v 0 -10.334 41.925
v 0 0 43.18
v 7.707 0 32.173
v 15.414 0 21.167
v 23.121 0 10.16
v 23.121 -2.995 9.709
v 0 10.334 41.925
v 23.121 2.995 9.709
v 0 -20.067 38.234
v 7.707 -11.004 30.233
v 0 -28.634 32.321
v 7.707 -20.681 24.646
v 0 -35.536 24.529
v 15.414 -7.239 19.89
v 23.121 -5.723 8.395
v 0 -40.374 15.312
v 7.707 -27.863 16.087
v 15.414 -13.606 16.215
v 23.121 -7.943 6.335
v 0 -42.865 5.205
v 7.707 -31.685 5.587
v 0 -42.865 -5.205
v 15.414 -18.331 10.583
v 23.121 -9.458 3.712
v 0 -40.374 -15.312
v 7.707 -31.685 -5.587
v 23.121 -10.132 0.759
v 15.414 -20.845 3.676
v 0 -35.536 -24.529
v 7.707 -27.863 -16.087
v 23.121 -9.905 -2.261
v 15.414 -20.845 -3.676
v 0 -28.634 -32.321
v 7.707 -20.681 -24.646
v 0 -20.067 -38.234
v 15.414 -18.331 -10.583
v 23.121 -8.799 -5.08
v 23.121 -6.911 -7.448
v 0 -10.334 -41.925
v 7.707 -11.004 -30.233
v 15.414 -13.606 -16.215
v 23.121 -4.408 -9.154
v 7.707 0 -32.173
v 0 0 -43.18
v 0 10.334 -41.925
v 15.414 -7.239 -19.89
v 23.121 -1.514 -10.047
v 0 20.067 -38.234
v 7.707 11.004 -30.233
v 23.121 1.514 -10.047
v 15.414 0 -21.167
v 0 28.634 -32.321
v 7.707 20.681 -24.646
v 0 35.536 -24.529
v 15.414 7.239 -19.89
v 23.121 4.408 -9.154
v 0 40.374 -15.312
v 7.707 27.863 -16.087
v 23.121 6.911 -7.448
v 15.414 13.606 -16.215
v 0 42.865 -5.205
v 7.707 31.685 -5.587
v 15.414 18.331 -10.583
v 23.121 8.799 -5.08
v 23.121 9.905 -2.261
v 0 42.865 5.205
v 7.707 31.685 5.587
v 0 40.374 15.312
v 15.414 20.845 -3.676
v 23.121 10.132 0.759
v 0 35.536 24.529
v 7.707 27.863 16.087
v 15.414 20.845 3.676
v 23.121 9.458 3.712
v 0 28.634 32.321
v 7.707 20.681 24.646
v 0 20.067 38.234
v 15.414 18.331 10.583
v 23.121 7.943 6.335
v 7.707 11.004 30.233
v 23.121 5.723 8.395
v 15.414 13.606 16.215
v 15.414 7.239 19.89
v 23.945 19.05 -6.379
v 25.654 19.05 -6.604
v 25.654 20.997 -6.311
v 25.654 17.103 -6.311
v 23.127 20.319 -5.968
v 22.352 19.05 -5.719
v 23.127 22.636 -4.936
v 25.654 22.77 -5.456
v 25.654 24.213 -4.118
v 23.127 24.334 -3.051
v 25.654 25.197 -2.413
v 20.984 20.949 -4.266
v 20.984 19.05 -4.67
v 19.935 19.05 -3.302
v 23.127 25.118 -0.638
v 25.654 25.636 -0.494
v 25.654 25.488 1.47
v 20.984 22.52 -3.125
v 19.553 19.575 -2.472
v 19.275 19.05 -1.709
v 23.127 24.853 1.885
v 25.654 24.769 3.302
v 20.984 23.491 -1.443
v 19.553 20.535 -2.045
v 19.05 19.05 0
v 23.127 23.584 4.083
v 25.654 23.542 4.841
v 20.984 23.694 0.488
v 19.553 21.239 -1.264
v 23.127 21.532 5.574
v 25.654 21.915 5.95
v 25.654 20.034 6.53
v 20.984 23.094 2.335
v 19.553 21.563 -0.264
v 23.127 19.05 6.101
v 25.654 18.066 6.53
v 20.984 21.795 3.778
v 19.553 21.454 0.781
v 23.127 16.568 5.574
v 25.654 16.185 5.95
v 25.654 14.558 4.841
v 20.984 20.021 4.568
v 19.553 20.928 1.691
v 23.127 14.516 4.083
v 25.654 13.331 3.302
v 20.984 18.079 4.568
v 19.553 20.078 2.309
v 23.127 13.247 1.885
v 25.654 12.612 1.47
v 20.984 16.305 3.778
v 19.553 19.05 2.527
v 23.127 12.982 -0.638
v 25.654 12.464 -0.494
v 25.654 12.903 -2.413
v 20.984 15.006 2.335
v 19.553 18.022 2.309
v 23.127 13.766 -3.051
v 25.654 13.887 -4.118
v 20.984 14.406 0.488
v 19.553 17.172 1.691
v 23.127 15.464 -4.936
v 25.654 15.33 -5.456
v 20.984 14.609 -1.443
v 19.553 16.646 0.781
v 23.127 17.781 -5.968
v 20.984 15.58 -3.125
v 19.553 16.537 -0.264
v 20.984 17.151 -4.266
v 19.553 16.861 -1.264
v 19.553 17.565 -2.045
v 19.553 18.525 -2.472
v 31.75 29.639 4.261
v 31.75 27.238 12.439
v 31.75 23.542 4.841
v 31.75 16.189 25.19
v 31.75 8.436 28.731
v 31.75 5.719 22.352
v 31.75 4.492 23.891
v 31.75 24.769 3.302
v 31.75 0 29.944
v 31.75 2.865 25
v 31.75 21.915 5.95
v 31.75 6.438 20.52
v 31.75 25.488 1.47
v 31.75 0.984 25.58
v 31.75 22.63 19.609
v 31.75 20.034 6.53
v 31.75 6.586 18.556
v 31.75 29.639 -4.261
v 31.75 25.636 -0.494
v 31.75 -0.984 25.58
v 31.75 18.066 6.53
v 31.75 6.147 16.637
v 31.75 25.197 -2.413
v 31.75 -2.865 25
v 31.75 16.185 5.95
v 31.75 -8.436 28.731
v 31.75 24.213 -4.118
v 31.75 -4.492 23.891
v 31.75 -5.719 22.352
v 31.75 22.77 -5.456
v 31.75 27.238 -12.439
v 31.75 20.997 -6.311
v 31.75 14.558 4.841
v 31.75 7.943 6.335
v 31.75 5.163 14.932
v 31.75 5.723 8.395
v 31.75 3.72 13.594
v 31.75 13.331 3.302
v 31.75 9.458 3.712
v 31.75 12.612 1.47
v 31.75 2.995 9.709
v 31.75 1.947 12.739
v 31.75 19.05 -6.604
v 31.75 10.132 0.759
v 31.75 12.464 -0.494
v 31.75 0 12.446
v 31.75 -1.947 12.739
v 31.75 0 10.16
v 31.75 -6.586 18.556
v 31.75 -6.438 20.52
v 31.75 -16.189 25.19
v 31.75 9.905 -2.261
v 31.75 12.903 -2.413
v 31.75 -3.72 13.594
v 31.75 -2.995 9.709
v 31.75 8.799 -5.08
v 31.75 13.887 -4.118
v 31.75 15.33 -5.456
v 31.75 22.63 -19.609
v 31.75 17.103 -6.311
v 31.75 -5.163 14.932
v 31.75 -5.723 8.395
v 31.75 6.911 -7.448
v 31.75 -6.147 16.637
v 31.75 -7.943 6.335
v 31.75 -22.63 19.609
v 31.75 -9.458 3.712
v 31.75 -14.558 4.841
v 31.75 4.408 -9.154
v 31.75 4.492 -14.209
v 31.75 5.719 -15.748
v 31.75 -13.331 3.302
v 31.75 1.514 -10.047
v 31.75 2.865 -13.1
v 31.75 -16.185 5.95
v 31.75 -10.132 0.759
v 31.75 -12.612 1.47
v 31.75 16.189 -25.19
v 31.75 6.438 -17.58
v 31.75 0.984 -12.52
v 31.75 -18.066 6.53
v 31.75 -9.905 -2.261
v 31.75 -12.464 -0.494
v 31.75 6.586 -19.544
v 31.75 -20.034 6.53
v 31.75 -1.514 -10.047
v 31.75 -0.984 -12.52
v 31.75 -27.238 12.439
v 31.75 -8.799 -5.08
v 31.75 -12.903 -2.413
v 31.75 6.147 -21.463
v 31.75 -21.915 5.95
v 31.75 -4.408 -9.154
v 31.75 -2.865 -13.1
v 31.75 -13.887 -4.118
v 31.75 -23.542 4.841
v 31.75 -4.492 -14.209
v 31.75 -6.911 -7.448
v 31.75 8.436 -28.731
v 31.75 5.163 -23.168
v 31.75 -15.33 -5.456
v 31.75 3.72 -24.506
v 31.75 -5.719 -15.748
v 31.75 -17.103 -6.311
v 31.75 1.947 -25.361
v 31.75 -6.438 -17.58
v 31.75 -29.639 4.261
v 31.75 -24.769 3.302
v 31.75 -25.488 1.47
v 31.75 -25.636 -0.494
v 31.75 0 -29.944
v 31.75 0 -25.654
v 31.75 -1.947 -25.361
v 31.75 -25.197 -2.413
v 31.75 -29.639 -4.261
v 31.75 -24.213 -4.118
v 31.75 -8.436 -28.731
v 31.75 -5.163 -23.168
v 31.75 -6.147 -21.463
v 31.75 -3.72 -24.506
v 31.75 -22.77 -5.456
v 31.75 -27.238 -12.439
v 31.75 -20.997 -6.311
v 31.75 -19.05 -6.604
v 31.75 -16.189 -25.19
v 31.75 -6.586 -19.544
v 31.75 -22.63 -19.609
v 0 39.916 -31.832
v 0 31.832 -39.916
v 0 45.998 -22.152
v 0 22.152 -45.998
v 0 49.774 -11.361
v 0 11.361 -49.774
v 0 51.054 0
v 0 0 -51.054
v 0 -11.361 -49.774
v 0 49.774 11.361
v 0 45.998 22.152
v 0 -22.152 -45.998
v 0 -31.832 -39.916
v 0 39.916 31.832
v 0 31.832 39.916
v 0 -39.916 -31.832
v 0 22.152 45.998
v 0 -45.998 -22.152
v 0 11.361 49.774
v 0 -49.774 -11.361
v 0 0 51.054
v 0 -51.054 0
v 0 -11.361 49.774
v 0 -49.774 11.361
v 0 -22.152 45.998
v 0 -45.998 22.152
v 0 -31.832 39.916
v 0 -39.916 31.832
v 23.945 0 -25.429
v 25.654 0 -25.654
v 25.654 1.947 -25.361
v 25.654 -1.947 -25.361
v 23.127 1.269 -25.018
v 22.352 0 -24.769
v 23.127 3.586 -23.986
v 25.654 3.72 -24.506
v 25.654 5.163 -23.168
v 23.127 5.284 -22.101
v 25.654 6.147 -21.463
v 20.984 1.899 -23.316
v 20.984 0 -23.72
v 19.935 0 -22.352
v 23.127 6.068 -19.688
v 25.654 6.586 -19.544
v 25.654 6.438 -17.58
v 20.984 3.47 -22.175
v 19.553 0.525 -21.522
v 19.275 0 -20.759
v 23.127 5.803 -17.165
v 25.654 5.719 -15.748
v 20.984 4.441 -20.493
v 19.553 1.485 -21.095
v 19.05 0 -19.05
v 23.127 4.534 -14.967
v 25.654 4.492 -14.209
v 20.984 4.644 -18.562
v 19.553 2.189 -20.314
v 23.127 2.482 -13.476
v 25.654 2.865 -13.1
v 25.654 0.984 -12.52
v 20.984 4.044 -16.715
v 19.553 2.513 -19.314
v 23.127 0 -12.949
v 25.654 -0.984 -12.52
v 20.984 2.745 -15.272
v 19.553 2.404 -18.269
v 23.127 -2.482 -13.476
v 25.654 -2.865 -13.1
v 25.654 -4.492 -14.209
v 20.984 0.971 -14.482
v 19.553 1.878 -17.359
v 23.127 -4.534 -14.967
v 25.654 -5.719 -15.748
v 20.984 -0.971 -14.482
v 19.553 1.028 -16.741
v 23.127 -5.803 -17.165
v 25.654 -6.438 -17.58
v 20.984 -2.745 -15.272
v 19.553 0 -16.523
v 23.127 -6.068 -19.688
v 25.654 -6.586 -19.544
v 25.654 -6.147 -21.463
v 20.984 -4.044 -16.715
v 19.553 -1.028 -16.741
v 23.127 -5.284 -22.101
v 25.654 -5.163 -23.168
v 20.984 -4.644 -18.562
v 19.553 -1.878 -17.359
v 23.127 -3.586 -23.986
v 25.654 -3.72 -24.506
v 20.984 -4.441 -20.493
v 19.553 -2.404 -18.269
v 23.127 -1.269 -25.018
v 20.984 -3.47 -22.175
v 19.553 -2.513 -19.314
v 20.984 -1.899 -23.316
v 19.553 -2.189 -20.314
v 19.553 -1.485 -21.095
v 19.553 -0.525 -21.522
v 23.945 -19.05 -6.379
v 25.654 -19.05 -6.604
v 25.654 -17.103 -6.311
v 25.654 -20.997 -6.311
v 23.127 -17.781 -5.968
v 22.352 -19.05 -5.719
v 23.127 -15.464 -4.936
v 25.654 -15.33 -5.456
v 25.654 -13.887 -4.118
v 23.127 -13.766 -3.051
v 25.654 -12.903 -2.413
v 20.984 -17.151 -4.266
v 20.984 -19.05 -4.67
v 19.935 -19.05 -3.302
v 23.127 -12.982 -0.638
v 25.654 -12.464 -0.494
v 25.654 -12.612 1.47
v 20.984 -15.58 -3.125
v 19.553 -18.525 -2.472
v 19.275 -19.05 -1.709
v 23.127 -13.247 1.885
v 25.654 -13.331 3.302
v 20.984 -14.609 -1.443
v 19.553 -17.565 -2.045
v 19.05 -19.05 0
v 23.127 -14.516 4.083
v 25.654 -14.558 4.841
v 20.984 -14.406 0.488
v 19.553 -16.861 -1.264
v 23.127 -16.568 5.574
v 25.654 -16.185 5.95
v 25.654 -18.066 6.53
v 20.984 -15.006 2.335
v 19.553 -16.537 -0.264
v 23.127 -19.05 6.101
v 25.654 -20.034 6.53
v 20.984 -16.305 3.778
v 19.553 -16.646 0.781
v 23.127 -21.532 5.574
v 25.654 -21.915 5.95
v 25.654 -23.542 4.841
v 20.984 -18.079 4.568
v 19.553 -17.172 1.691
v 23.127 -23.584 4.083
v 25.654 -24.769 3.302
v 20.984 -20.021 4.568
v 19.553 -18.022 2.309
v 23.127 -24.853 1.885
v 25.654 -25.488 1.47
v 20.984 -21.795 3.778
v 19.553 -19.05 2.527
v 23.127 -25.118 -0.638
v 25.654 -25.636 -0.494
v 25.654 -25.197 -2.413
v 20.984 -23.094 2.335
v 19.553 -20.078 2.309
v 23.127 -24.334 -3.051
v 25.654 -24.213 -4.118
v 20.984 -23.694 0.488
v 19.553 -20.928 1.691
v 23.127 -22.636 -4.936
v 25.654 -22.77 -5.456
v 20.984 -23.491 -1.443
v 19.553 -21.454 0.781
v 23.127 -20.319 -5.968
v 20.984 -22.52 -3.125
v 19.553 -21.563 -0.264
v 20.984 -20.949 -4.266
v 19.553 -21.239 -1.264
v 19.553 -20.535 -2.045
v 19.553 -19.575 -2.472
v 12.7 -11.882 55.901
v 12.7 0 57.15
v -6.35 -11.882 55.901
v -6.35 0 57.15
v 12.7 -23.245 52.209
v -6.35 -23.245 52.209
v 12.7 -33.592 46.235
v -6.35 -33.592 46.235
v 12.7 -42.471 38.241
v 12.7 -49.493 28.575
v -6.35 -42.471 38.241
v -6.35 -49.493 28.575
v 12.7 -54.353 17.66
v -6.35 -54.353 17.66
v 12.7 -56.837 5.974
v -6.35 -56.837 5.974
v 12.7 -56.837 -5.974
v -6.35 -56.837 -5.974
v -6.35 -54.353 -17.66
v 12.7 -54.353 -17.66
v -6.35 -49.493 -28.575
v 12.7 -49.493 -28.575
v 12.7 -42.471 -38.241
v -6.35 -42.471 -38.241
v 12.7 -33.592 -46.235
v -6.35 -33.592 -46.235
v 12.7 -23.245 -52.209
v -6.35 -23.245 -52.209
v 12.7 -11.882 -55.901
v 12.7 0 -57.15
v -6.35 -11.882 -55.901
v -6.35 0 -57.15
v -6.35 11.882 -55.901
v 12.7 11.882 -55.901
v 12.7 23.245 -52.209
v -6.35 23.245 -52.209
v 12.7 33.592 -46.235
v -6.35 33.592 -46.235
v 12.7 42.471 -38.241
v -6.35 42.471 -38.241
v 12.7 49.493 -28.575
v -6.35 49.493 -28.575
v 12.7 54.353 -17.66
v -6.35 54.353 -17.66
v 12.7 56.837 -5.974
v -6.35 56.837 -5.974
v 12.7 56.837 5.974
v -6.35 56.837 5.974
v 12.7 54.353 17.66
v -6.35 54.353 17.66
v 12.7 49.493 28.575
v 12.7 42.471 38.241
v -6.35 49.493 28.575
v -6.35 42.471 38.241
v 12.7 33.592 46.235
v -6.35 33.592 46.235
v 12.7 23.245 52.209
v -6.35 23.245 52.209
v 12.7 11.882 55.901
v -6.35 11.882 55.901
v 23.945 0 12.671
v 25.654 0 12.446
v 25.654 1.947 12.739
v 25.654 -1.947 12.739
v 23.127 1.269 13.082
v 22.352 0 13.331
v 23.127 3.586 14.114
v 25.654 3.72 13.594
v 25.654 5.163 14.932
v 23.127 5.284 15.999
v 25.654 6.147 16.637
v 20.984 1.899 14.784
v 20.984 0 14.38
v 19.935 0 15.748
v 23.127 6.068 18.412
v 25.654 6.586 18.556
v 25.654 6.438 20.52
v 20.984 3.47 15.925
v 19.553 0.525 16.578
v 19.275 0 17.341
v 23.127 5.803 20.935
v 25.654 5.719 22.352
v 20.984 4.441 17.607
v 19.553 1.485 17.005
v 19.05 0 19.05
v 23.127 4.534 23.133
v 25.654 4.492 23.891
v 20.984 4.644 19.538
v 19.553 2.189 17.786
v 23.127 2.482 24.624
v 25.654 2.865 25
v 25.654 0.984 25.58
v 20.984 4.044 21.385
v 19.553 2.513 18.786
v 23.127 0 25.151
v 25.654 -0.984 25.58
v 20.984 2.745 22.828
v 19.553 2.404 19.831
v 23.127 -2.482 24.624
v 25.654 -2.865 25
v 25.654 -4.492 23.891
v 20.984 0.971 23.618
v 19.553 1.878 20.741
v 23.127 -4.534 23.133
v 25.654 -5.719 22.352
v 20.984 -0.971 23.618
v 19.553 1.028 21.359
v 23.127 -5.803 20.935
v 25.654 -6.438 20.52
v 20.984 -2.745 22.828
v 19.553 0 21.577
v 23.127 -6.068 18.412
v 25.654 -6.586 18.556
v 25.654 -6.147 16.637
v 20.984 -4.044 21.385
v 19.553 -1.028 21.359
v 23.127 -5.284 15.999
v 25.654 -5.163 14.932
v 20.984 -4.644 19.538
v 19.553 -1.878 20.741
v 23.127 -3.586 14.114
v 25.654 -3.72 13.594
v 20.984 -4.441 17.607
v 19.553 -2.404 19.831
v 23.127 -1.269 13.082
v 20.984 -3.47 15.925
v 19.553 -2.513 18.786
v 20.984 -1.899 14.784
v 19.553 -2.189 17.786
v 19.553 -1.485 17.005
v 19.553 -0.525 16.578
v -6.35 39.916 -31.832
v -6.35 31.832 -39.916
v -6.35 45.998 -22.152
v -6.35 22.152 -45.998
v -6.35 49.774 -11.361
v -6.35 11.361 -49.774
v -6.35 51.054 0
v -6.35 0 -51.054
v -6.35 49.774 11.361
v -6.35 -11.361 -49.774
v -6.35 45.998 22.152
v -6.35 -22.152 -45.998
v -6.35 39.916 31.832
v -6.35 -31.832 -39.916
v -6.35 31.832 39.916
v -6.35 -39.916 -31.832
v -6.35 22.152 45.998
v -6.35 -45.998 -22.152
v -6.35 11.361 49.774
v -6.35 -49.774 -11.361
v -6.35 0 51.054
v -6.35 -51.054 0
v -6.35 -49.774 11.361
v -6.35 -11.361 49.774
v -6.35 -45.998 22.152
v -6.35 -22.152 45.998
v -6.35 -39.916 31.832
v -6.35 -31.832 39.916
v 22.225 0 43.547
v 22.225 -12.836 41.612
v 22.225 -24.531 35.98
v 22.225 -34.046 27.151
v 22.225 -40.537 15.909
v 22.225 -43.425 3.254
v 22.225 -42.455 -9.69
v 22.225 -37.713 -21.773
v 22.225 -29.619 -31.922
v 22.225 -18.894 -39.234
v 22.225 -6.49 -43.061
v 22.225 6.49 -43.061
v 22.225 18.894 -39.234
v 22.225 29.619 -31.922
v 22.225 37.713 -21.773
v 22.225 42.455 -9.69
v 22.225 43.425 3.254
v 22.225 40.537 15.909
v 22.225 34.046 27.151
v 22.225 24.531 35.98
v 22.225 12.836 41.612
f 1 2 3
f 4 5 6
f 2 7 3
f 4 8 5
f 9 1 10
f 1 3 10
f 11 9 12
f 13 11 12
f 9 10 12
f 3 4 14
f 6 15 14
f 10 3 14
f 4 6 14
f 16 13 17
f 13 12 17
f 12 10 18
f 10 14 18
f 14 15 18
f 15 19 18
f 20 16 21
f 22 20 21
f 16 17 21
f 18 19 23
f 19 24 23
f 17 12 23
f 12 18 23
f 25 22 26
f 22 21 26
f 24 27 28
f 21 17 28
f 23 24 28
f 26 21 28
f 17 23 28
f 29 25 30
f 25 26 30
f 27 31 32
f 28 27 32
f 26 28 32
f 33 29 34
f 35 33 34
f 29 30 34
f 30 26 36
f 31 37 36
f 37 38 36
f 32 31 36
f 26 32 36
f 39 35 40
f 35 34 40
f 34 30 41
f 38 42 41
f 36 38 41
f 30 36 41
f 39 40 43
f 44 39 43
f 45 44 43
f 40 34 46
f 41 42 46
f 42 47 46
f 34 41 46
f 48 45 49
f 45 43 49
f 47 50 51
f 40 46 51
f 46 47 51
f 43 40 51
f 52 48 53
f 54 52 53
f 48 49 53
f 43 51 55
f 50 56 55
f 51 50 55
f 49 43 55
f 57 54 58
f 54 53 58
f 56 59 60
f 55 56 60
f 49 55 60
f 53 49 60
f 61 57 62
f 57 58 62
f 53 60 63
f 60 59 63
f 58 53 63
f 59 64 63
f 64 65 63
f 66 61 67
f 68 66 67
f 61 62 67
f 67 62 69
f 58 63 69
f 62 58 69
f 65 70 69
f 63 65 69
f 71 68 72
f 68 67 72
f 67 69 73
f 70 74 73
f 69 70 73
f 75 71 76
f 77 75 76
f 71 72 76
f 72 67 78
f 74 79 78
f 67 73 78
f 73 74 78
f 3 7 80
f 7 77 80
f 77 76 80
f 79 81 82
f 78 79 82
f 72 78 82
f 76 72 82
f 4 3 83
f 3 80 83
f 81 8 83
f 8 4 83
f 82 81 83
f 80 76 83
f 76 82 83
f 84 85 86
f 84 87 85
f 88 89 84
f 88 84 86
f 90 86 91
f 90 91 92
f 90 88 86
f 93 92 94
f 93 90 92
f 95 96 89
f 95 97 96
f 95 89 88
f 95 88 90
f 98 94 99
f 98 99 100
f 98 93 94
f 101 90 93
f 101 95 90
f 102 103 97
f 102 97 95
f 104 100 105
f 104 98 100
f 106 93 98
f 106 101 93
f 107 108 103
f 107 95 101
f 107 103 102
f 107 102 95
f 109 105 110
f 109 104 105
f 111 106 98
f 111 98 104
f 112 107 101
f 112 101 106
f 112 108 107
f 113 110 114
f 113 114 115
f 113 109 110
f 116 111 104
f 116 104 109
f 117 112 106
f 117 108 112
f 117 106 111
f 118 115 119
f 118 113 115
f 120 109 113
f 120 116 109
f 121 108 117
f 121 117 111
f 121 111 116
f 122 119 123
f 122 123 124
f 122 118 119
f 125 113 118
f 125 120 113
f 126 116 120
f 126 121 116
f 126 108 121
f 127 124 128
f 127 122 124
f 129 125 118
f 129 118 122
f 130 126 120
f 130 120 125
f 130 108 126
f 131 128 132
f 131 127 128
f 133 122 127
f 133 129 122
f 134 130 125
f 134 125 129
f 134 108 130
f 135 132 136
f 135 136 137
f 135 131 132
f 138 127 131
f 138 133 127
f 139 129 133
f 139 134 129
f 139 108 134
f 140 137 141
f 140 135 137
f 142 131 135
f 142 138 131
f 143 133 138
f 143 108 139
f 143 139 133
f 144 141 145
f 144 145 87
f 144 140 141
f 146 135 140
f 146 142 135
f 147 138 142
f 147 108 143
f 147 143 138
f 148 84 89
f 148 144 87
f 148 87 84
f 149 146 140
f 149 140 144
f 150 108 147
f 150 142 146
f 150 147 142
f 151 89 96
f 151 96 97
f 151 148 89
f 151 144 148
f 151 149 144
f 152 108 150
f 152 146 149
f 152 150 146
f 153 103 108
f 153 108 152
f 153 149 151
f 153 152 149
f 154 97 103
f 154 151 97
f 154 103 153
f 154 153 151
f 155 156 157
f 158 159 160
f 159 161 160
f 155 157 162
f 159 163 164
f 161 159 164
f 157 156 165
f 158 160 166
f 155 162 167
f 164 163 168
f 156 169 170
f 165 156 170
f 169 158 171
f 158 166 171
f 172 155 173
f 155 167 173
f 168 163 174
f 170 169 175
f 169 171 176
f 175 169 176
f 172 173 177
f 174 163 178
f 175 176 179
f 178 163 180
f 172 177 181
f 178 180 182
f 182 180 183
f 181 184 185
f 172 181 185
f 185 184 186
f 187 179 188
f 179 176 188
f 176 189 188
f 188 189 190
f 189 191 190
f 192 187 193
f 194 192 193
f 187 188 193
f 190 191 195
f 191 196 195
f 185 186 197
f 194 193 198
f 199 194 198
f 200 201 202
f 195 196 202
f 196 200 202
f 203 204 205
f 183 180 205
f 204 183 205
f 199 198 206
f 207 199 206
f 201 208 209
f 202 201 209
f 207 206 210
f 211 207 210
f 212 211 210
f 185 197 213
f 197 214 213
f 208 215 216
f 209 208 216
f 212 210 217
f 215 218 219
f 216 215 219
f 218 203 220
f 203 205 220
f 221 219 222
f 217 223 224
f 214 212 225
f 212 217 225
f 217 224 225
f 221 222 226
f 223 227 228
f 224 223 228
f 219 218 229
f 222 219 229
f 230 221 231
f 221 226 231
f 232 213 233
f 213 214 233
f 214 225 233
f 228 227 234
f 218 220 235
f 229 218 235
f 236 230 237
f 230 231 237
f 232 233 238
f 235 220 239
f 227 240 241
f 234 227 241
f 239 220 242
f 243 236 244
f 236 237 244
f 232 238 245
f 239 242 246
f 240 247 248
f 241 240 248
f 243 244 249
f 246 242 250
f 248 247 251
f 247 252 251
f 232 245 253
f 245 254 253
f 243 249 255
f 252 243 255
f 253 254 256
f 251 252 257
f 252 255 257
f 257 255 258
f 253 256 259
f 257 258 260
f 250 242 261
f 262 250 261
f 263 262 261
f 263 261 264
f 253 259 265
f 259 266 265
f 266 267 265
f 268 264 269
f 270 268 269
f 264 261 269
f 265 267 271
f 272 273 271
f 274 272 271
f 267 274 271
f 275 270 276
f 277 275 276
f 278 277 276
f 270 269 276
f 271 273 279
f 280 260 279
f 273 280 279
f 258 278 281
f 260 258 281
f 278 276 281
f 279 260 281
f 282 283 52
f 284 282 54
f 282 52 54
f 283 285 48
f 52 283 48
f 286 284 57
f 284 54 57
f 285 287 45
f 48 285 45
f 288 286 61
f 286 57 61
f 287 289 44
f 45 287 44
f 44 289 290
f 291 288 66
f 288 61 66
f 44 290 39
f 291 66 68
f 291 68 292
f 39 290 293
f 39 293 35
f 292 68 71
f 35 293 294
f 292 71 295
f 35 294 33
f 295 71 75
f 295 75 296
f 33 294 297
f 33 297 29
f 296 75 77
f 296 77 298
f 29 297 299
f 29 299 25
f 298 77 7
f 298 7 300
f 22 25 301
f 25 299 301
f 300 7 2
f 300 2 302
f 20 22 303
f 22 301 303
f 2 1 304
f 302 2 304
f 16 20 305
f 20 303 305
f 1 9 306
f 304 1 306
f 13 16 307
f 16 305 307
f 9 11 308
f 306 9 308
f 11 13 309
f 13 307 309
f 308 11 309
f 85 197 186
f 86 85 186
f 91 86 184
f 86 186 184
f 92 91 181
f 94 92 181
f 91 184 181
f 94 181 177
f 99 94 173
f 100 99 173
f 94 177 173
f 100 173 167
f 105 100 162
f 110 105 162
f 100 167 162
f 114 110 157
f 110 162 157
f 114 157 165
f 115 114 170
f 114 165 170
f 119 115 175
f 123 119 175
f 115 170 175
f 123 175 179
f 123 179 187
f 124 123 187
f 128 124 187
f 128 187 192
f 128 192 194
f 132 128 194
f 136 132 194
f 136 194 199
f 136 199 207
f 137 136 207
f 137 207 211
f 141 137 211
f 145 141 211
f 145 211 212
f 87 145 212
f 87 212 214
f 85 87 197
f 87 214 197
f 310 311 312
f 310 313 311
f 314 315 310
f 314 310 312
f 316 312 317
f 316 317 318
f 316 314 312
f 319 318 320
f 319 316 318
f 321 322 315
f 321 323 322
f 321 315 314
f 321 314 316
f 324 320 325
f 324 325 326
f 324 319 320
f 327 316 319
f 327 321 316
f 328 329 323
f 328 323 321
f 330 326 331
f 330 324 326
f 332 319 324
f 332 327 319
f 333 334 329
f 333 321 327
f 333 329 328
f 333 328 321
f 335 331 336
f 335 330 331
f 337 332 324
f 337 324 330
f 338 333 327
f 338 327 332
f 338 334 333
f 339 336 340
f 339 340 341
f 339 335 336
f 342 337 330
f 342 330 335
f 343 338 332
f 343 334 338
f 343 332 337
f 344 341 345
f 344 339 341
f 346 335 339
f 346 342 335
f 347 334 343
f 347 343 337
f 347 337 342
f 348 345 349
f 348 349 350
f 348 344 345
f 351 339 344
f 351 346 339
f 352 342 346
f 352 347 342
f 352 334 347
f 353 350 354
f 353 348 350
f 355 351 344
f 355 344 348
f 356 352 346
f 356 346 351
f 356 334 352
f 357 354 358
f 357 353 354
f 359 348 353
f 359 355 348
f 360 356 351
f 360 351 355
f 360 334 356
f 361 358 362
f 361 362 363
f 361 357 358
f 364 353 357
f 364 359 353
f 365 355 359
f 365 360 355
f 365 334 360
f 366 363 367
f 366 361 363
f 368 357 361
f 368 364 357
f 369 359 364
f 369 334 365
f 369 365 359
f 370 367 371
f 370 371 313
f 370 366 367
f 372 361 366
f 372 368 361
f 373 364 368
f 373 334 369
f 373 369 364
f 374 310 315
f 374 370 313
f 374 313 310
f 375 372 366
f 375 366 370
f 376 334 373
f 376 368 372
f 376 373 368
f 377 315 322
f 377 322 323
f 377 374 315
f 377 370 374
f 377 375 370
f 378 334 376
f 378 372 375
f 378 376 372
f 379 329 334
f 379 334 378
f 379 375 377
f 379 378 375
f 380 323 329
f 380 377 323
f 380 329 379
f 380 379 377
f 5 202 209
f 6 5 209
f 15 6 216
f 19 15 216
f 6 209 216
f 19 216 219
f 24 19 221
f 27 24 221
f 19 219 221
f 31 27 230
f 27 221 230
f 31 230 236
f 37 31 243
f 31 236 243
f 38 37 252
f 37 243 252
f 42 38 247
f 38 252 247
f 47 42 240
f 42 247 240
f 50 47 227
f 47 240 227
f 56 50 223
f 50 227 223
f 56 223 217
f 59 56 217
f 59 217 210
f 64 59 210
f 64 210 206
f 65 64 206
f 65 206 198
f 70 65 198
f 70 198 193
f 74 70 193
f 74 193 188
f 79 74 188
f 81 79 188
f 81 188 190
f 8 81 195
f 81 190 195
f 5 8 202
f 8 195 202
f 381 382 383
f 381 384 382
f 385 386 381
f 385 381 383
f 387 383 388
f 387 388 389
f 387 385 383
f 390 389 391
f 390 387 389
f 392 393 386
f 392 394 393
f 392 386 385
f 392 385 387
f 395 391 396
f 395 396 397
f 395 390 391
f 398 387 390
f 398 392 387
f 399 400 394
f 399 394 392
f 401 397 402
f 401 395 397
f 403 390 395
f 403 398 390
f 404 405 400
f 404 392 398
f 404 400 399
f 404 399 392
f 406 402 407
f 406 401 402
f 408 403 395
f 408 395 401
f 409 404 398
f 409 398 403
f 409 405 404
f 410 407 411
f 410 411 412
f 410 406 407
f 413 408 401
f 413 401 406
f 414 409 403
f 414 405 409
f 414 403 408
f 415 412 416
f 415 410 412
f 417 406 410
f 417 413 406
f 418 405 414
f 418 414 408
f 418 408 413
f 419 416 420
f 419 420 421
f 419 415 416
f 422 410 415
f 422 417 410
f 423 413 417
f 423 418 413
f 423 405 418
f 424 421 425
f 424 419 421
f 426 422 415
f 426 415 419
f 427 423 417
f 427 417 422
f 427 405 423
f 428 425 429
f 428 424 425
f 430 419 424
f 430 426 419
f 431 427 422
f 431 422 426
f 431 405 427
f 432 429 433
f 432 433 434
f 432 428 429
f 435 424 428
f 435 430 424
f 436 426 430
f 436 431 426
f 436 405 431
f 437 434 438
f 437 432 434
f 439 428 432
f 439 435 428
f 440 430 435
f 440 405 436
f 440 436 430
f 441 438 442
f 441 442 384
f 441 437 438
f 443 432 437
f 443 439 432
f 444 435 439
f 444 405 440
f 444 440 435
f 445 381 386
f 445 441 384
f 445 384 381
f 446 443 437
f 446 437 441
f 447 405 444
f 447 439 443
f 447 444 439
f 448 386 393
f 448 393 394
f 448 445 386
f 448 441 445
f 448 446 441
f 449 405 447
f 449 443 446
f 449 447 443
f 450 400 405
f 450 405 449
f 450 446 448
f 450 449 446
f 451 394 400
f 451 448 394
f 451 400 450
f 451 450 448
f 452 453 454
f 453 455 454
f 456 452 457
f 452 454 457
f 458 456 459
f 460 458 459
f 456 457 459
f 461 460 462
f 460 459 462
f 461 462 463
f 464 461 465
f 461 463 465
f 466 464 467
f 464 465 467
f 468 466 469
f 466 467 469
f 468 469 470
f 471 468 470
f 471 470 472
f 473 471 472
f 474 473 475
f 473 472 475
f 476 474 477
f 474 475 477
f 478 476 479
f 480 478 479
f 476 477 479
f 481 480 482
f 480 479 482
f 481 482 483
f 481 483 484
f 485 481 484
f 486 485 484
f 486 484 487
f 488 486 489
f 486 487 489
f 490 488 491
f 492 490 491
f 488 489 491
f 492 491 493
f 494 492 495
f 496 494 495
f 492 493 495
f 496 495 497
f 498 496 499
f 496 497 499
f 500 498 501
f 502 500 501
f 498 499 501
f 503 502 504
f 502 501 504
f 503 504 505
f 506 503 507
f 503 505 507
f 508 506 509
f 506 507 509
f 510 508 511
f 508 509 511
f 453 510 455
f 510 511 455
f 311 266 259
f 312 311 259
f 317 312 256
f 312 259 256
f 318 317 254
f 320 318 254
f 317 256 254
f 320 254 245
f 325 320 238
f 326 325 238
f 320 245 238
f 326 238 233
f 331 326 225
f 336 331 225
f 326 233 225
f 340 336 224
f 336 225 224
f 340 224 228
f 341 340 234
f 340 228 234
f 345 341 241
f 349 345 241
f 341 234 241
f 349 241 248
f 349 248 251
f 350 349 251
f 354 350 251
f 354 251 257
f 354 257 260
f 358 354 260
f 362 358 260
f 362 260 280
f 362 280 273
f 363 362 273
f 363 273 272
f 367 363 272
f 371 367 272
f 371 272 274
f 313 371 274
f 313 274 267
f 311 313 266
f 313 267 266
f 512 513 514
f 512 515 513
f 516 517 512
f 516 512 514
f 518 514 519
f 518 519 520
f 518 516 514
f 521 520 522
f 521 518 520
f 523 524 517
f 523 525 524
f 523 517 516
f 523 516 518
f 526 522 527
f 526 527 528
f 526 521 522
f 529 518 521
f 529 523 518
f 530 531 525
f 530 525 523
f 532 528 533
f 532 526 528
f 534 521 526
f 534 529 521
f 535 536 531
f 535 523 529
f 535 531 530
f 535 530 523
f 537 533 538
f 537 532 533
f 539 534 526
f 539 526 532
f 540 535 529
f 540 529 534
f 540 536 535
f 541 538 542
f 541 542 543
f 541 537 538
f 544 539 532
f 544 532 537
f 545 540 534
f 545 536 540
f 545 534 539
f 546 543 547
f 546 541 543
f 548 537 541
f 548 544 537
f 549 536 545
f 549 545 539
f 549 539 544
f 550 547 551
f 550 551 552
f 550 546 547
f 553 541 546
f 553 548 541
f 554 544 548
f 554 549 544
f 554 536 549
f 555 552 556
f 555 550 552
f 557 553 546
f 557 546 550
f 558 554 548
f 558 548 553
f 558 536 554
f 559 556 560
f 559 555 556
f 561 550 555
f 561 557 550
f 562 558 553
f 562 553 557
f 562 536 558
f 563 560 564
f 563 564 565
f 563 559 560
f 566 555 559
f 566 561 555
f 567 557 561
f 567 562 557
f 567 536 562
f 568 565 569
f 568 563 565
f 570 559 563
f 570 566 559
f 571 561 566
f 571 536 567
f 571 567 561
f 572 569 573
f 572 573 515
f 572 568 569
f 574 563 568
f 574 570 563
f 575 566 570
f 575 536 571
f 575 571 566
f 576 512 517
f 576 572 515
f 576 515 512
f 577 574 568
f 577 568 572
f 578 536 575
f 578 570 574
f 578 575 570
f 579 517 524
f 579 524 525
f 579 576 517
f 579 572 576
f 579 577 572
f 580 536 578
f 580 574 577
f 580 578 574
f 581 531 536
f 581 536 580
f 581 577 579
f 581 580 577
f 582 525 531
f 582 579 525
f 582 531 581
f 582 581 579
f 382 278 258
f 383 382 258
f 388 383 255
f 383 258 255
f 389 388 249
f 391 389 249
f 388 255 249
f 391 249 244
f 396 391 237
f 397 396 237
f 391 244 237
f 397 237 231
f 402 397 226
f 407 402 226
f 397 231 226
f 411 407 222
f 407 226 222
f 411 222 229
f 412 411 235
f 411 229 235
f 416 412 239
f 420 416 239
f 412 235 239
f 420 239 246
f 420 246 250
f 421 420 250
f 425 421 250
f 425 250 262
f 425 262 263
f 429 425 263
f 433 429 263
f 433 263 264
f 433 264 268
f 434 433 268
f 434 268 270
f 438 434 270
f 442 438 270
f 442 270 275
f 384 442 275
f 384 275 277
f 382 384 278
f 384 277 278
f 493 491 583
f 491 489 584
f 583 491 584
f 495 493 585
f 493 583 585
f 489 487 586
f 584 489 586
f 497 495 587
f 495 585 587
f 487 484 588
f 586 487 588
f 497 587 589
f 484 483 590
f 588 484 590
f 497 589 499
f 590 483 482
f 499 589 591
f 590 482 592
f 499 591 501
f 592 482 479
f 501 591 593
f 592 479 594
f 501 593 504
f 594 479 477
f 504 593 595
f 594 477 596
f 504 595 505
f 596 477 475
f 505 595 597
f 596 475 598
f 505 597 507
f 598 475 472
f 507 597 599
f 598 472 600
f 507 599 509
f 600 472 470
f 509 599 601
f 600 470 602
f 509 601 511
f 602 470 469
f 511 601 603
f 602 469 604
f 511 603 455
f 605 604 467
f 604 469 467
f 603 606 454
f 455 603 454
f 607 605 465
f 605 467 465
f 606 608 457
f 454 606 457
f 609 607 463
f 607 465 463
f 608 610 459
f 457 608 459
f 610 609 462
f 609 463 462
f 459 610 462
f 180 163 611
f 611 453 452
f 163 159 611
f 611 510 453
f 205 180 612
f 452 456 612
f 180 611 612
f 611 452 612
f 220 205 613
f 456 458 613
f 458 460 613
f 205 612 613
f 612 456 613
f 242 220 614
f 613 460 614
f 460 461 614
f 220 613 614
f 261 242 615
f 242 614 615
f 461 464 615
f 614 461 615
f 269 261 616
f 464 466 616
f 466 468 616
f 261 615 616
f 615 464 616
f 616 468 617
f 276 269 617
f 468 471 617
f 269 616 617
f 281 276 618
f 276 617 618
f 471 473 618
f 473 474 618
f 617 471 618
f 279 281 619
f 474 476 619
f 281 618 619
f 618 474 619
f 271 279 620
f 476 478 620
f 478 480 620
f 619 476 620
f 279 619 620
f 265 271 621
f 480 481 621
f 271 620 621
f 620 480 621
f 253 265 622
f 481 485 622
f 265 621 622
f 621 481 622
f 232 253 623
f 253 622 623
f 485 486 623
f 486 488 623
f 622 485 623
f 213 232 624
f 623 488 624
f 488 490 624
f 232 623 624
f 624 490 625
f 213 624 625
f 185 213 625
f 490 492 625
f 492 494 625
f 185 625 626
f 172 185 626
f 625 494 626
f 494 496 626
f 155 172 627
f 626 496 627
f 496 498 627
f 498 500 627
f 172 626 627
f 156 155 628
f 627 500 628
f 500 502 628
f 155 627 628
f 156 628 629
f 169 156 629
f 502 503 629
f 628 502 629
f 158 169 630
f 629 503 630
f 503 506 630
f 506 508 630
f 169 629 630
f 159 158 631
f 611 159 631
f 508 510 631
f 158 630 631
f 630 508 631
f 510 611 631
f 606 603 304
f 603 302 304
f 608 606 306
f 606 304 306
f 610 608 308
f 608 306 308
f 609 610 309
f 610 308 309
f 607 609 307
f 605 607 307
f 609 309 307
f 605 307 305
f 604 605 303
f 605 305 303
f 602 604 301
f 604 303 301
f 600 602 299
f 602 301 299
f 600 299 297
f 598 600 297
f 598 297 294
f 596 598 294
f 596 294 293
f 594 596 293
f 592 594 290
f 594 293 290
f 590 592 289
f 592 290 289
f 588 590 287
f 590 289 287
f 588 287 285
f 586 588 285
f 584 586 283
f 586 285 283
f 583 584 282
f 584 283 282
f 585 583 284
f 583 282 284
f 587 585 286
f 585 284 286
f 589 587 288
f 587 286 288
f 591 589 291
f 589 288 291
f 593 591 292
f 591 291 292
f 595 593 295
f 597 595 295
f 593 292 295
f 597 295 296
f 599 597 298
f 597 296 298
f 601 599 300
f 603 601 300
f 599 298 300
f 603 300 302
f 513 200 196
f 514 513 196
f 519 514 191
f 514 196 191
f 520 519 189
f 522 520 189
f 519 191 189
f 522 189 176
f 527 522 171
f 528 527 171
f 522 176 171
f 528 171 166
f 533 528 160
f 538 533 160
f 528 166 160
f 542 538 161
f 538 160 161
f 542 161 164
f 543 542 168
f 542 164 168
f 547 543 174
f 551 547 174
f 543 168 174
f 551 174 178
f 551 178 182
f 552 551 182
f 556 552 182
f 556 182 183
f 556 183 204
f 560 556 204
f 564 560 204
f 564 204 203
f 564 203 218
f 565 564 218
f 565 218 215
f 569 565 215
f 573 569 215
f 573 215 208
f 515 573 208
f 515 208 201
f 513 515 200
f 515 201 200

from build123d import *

# Parameters (mm, degrees)
SKETCH2_R          = 6.604
CUT_EXTRUDE1_DEPTH = 12.7
FILLET1_R          = 6.604
CHAMFER1_SIZE      = 33.02
CHAMFER1_SIZE2     = 23.120852912


with BuildPart() as part:
    # Sketch1 → Revolve1 (revolve)
    with BuildSketch(Plane.XY, mode=Mode.PRIVATE) as revolve1_sk:
        Polygon((0, 51.054), (0, 10.16), (31.75, 10.16), (31.75, 29.943780472), (12.7, 57.15), (-6.35, 57.15), (-6.35, 51.054), align=None)
    revolve(revolve1_sk.sketch.rotate(Axis((0, 0, 0), (1, 0, 0)), 90), axis=Axis((0, 0, 0), (1, 0, 0)))

    # Sketch2 → Cut-Extrude1 (cut)
    with BuildSketch(Plane(origin=(31.75, 0, 0), x_dir=(0, 0, -1), z_dir=(1, 0, 0))):
        with Locations((-19.05, 0)):
            Circle(SKETCH2_R)
        with Locations((0, 19.05)):
            Circle(SKETCH2_R)
        with Locations((19.05, 0)):
            Circle(SKETCH2_R)
        with Locations((0, -19.05)):
            Circle(SKETCH2_R)
    extrude(amount=-CUT_EXTRUDE1_DEPTH, mode=Mode.SUBTRACT)

    # Fillet1
    fillet1_edges = [part.edges().sort_by_distance(p)[0] for p in [
        (19.05, 0, 25.654),
        (19.05, 19.05, 6.604),
        (19.05, 0, -12.446),
        (19.05, -19.05, 6.604),
    ]]
    fillet(fillet1_edges, radius=FILLET1_R)

    # Chamfer1
    chamfer1_edges = [part.edges().sort_by_distance(p)[0] for p in [
        (0, 0, -10.16),
    ]]
    chamfer1_side = [part.faces().sort_by_distance(p)[0] for p in [
        (0, 0, -49.609974816),
    ]]
    chamfer(chamfer1_edges, length=CHAMFER1_SIZE, length2=CHAMFER1_SIZE2, reference=chamfer1_side[0])


solid = part.part
